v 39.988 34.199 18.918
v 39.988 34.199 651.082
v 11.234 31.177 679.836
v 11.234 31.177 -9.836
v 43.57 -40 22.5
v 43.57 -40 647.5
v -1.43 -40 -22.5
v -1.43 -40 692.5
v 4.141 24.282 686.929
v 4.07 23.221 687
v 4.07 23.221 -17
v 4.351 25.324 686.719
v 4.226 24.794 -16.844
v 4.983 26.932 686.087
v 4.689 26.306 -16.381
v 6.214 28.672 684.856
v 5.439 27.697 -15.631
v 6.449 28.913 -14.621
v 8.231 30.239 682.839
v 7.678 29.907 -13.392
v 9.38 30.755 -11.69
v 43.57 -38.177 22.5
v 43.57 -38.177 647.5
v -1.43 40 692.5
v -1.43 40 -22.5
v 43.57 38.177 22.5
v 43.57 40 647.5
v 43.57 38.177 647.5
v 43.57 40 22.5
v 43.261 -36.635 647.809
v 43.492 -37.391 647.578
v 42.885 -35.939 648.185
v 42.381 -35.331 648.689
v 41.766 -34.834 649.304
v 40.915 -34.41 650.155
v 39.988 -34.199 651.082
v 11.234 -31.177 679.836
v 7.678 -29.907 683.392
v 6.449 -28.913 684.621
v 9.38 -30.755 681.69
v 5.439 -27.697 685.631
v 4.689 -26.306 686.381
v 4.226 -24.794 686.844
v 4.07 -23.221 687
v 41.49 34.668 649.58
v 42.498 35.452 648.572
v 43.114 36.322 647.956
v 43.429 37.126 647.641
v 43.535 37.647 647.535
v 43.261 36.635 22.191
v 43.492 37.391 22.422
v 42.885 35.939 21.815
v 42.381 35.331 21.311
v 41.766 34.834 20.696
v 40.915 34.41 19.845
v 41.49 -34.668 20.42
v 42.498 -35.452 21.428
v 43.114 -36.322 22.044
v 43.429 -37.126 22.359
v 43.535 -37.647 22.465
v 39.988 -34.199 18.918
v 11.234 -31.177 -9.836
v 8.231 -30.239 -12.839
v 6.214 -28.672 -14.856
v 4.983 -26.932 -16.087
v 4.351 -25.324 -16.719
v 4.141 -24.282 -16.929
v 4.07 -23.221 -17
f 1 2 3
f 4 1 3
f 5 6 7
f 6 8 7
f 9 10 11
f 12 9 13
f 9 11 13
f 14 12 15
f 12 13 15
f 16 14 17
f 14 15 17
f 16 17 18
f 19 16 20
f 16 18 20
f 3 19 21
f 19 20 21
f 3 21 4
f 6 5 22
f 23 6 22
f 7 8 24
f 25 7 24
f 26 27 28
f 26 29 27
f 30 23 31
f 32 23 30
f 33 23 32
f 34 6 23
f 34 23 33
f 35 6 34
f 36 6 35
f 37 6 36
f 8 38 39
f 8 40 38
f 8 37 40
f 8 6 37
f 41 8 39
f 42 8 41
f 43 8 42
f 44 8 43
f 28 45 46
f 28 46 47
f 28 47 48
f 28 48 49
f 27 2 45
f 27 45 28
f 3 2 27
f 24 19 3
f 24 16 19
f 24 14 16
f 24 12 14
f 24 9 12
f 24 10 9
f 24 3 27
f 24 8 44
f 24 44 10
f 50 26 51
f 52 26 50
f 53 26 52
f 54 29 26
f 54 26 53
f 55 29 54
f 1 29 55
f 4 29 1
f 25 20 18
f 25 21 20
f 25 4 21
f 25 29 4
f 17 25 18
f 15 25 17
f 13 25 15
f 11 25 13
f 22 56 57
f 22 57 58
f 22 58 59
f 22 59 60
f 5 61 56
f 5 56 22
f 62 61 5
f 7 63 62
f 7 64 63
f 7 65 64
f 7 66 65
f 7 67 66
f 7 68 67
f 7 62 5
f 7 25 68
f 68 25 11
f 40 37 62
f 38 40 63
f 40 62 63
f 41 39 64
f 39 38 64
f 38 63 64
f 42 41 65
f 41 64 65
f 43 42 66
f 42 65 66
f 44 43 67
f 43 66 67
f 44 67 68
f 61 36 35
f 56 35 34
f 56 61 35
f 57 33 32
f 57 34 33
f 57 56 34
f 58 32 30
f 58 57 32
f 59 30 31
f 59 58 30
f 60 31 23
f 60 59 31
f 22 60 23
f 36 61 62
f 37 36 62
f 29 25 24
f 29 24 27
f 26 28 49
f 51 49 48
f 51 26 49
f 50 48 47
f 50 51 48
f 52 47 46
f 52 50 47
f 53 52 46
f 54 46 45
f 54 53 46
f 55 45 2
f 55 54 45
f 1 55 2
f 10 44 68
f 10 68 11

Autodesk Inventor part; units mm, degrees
ref_plane "Начальная плоскость" through (0, 0, -22.5) normal (0, 0, 1) x (1, 0, 0)
ref_plane "Конечная плоскость" through (0, 0, 692.5) normal (0, 0, 1) x (1, 0, 0)
sketch "Эскиз" plane through (0, 0, 0) normal (0, 0, 1) x (1, 0, 0)
  line L0 (-1.43, 0) -> (-1.43, 40)
  line L1 (-1.43, 40) -> (43.57, 40)
  line L2 (43.57, 40) -> (43.57, 38.1774)
  line L3 (39.9881, 34.1993) -> (11.2338, 31.1771)
  line L4 (4.07, 23.221) -> (4.07, 0)
  line L5 (4.07, 0) -> (-1.43, 0) construction
  line L6 (23.82, 40) -> (23.82, 32.5) construction
  line L7 (43.57, 34.5758) -> (43.57, 32.5) construction
  line L8 (43.57, 32.5) -> (23.82, 32.5) construction
  line L9 (0, 15) -> (0, -27) construction
  line L10 (-5.539, 0) -> (16.0067, 0) construction
  line L11 (-1.43, 0) -> (-1.43, -40)
  line L12 (-1.43, -40) -> (43.57, -40)
  line L13 (43.57, -40) -> (43.57, -38.1774)
  line L14 (39.9881, -34.1993) -> (11.2338, -31.1771)
  line L15 (4.07, -23.221) -> (4.07, 0)
  arc A0 (11.2338, 31.1771) -> (4.07, 23.221) centre (12.07, 23.221) ccw
  arc A1 (4.07, -23.221) -> (11.2338, -31.1771) centre (12.07, -23.221) ccw
  arc A2 (39.9881, 34.1993) -> (43.57, 38.1774) centre (39.57, 38.1774) ccw
  arc A3 (43.57, -38.1774) -> (39.9881, -34.1993) centre (39.57, -38.1774) ccw
  line L16 (0, 56) -> (0, -56) construction
  line L17 (-15.5135, 0) -> (54.308, 0) construction
  point P0 (4.07, 30.4242)
  point P1 (43.57, -34.5758)
  point P2 (4.07, -30.4242)
  point P3 (23.82, -40)
  point P4 (23.82, -32.5)
  dimension "d0" = 5.5
  dimension "d1" = 40
  dimension "d2" = 45
  dimension "d3" = 7.5
  dimension "d4" = 19.75
  dimension "d5" = 2.0758
  dimension "d23" = 8
  dimension "d24" = 4
  dimension "d25" = 1.43
extrude "Тело" add sketch "Эскиз" along normal up to surface (715 mm away) from surface at -22.5
sketch "Sketch3" plane through (0, 0, 0) normal (0, 0, 1) x (1, 0, 0)
  line L0 (0, 0) -> (10, 0)
ref_plane "Work Plane3" through (0, 0, 0) normal (0, -1, 0) x (1, 0, 0)
sketch "Sketch4" plane through (0, 0, 0) normal (0, -1, 0) x (1, 0, 0)
  line L0 (-2, -22.5) -> (12, -22.5)
  line L1 (-2, 692.5) -> (12, 692.5)
  dimension "d29" = 715
ref_plane "РабПлоскость4" through (-1.43, 0, -22.5) normal (0.7071, 0, -0.7071) x (-0.7071, 0, -0.7071)
split "Разделение1" plane through (-1.43, 0, -22.5) removes the side toward (0.7071, 0, -0.7071)
ref_plane "РабПлоскость5" through (-1.43, 0, 692.5) normal (0.7071, 0, 0.7071) x (0.7071, 0, -0.7071)
split "Разделение2" plane through (-1.43, 0, 692.5) removes the side toward (0.7071, 0, 0.7071)
equation "\"d0\" = G_T"
equation "\"d1\" = 0.5 * G_H"
equation "\"d2\" = G_W"
equation "\"d3\" = G_T1"
equation "\"d4\" = G_C"
equation "\"d23\" = G_IR"
equation "\"d24\" = G_ER"
equation "\"d25\" = ex"
equation "\"d6\" = G_L"
equation "\"G_W\" = 45"
equation "\"G_T\" = 5.5"
equation "\"G_T1\" = 7.5"
equation "\"G_NG\" = 0.105104"
equation "\"G_ER\" = 4"
equation "\"G_IR\" = 8"
equation "\"G_C\" = 19.75"
equation "\"G_L\" = d29"
equation "\"ex\" = 1.43"
equation "\"G_OFFSET_START\" = 22.5"
equation "\"G_OFFSET_END\" = 22.5"
equation "\"d26\" = -G_OFFSET_START"
equation "\"d27\" = G_OFFSET_END + B_L"
equation "\"G_H\" = 80"
equation "\"B_L\" = 670"
properties part number "ISO 657/11 - CH 80 x 8 - 715" material "Сталь, мягкая"
